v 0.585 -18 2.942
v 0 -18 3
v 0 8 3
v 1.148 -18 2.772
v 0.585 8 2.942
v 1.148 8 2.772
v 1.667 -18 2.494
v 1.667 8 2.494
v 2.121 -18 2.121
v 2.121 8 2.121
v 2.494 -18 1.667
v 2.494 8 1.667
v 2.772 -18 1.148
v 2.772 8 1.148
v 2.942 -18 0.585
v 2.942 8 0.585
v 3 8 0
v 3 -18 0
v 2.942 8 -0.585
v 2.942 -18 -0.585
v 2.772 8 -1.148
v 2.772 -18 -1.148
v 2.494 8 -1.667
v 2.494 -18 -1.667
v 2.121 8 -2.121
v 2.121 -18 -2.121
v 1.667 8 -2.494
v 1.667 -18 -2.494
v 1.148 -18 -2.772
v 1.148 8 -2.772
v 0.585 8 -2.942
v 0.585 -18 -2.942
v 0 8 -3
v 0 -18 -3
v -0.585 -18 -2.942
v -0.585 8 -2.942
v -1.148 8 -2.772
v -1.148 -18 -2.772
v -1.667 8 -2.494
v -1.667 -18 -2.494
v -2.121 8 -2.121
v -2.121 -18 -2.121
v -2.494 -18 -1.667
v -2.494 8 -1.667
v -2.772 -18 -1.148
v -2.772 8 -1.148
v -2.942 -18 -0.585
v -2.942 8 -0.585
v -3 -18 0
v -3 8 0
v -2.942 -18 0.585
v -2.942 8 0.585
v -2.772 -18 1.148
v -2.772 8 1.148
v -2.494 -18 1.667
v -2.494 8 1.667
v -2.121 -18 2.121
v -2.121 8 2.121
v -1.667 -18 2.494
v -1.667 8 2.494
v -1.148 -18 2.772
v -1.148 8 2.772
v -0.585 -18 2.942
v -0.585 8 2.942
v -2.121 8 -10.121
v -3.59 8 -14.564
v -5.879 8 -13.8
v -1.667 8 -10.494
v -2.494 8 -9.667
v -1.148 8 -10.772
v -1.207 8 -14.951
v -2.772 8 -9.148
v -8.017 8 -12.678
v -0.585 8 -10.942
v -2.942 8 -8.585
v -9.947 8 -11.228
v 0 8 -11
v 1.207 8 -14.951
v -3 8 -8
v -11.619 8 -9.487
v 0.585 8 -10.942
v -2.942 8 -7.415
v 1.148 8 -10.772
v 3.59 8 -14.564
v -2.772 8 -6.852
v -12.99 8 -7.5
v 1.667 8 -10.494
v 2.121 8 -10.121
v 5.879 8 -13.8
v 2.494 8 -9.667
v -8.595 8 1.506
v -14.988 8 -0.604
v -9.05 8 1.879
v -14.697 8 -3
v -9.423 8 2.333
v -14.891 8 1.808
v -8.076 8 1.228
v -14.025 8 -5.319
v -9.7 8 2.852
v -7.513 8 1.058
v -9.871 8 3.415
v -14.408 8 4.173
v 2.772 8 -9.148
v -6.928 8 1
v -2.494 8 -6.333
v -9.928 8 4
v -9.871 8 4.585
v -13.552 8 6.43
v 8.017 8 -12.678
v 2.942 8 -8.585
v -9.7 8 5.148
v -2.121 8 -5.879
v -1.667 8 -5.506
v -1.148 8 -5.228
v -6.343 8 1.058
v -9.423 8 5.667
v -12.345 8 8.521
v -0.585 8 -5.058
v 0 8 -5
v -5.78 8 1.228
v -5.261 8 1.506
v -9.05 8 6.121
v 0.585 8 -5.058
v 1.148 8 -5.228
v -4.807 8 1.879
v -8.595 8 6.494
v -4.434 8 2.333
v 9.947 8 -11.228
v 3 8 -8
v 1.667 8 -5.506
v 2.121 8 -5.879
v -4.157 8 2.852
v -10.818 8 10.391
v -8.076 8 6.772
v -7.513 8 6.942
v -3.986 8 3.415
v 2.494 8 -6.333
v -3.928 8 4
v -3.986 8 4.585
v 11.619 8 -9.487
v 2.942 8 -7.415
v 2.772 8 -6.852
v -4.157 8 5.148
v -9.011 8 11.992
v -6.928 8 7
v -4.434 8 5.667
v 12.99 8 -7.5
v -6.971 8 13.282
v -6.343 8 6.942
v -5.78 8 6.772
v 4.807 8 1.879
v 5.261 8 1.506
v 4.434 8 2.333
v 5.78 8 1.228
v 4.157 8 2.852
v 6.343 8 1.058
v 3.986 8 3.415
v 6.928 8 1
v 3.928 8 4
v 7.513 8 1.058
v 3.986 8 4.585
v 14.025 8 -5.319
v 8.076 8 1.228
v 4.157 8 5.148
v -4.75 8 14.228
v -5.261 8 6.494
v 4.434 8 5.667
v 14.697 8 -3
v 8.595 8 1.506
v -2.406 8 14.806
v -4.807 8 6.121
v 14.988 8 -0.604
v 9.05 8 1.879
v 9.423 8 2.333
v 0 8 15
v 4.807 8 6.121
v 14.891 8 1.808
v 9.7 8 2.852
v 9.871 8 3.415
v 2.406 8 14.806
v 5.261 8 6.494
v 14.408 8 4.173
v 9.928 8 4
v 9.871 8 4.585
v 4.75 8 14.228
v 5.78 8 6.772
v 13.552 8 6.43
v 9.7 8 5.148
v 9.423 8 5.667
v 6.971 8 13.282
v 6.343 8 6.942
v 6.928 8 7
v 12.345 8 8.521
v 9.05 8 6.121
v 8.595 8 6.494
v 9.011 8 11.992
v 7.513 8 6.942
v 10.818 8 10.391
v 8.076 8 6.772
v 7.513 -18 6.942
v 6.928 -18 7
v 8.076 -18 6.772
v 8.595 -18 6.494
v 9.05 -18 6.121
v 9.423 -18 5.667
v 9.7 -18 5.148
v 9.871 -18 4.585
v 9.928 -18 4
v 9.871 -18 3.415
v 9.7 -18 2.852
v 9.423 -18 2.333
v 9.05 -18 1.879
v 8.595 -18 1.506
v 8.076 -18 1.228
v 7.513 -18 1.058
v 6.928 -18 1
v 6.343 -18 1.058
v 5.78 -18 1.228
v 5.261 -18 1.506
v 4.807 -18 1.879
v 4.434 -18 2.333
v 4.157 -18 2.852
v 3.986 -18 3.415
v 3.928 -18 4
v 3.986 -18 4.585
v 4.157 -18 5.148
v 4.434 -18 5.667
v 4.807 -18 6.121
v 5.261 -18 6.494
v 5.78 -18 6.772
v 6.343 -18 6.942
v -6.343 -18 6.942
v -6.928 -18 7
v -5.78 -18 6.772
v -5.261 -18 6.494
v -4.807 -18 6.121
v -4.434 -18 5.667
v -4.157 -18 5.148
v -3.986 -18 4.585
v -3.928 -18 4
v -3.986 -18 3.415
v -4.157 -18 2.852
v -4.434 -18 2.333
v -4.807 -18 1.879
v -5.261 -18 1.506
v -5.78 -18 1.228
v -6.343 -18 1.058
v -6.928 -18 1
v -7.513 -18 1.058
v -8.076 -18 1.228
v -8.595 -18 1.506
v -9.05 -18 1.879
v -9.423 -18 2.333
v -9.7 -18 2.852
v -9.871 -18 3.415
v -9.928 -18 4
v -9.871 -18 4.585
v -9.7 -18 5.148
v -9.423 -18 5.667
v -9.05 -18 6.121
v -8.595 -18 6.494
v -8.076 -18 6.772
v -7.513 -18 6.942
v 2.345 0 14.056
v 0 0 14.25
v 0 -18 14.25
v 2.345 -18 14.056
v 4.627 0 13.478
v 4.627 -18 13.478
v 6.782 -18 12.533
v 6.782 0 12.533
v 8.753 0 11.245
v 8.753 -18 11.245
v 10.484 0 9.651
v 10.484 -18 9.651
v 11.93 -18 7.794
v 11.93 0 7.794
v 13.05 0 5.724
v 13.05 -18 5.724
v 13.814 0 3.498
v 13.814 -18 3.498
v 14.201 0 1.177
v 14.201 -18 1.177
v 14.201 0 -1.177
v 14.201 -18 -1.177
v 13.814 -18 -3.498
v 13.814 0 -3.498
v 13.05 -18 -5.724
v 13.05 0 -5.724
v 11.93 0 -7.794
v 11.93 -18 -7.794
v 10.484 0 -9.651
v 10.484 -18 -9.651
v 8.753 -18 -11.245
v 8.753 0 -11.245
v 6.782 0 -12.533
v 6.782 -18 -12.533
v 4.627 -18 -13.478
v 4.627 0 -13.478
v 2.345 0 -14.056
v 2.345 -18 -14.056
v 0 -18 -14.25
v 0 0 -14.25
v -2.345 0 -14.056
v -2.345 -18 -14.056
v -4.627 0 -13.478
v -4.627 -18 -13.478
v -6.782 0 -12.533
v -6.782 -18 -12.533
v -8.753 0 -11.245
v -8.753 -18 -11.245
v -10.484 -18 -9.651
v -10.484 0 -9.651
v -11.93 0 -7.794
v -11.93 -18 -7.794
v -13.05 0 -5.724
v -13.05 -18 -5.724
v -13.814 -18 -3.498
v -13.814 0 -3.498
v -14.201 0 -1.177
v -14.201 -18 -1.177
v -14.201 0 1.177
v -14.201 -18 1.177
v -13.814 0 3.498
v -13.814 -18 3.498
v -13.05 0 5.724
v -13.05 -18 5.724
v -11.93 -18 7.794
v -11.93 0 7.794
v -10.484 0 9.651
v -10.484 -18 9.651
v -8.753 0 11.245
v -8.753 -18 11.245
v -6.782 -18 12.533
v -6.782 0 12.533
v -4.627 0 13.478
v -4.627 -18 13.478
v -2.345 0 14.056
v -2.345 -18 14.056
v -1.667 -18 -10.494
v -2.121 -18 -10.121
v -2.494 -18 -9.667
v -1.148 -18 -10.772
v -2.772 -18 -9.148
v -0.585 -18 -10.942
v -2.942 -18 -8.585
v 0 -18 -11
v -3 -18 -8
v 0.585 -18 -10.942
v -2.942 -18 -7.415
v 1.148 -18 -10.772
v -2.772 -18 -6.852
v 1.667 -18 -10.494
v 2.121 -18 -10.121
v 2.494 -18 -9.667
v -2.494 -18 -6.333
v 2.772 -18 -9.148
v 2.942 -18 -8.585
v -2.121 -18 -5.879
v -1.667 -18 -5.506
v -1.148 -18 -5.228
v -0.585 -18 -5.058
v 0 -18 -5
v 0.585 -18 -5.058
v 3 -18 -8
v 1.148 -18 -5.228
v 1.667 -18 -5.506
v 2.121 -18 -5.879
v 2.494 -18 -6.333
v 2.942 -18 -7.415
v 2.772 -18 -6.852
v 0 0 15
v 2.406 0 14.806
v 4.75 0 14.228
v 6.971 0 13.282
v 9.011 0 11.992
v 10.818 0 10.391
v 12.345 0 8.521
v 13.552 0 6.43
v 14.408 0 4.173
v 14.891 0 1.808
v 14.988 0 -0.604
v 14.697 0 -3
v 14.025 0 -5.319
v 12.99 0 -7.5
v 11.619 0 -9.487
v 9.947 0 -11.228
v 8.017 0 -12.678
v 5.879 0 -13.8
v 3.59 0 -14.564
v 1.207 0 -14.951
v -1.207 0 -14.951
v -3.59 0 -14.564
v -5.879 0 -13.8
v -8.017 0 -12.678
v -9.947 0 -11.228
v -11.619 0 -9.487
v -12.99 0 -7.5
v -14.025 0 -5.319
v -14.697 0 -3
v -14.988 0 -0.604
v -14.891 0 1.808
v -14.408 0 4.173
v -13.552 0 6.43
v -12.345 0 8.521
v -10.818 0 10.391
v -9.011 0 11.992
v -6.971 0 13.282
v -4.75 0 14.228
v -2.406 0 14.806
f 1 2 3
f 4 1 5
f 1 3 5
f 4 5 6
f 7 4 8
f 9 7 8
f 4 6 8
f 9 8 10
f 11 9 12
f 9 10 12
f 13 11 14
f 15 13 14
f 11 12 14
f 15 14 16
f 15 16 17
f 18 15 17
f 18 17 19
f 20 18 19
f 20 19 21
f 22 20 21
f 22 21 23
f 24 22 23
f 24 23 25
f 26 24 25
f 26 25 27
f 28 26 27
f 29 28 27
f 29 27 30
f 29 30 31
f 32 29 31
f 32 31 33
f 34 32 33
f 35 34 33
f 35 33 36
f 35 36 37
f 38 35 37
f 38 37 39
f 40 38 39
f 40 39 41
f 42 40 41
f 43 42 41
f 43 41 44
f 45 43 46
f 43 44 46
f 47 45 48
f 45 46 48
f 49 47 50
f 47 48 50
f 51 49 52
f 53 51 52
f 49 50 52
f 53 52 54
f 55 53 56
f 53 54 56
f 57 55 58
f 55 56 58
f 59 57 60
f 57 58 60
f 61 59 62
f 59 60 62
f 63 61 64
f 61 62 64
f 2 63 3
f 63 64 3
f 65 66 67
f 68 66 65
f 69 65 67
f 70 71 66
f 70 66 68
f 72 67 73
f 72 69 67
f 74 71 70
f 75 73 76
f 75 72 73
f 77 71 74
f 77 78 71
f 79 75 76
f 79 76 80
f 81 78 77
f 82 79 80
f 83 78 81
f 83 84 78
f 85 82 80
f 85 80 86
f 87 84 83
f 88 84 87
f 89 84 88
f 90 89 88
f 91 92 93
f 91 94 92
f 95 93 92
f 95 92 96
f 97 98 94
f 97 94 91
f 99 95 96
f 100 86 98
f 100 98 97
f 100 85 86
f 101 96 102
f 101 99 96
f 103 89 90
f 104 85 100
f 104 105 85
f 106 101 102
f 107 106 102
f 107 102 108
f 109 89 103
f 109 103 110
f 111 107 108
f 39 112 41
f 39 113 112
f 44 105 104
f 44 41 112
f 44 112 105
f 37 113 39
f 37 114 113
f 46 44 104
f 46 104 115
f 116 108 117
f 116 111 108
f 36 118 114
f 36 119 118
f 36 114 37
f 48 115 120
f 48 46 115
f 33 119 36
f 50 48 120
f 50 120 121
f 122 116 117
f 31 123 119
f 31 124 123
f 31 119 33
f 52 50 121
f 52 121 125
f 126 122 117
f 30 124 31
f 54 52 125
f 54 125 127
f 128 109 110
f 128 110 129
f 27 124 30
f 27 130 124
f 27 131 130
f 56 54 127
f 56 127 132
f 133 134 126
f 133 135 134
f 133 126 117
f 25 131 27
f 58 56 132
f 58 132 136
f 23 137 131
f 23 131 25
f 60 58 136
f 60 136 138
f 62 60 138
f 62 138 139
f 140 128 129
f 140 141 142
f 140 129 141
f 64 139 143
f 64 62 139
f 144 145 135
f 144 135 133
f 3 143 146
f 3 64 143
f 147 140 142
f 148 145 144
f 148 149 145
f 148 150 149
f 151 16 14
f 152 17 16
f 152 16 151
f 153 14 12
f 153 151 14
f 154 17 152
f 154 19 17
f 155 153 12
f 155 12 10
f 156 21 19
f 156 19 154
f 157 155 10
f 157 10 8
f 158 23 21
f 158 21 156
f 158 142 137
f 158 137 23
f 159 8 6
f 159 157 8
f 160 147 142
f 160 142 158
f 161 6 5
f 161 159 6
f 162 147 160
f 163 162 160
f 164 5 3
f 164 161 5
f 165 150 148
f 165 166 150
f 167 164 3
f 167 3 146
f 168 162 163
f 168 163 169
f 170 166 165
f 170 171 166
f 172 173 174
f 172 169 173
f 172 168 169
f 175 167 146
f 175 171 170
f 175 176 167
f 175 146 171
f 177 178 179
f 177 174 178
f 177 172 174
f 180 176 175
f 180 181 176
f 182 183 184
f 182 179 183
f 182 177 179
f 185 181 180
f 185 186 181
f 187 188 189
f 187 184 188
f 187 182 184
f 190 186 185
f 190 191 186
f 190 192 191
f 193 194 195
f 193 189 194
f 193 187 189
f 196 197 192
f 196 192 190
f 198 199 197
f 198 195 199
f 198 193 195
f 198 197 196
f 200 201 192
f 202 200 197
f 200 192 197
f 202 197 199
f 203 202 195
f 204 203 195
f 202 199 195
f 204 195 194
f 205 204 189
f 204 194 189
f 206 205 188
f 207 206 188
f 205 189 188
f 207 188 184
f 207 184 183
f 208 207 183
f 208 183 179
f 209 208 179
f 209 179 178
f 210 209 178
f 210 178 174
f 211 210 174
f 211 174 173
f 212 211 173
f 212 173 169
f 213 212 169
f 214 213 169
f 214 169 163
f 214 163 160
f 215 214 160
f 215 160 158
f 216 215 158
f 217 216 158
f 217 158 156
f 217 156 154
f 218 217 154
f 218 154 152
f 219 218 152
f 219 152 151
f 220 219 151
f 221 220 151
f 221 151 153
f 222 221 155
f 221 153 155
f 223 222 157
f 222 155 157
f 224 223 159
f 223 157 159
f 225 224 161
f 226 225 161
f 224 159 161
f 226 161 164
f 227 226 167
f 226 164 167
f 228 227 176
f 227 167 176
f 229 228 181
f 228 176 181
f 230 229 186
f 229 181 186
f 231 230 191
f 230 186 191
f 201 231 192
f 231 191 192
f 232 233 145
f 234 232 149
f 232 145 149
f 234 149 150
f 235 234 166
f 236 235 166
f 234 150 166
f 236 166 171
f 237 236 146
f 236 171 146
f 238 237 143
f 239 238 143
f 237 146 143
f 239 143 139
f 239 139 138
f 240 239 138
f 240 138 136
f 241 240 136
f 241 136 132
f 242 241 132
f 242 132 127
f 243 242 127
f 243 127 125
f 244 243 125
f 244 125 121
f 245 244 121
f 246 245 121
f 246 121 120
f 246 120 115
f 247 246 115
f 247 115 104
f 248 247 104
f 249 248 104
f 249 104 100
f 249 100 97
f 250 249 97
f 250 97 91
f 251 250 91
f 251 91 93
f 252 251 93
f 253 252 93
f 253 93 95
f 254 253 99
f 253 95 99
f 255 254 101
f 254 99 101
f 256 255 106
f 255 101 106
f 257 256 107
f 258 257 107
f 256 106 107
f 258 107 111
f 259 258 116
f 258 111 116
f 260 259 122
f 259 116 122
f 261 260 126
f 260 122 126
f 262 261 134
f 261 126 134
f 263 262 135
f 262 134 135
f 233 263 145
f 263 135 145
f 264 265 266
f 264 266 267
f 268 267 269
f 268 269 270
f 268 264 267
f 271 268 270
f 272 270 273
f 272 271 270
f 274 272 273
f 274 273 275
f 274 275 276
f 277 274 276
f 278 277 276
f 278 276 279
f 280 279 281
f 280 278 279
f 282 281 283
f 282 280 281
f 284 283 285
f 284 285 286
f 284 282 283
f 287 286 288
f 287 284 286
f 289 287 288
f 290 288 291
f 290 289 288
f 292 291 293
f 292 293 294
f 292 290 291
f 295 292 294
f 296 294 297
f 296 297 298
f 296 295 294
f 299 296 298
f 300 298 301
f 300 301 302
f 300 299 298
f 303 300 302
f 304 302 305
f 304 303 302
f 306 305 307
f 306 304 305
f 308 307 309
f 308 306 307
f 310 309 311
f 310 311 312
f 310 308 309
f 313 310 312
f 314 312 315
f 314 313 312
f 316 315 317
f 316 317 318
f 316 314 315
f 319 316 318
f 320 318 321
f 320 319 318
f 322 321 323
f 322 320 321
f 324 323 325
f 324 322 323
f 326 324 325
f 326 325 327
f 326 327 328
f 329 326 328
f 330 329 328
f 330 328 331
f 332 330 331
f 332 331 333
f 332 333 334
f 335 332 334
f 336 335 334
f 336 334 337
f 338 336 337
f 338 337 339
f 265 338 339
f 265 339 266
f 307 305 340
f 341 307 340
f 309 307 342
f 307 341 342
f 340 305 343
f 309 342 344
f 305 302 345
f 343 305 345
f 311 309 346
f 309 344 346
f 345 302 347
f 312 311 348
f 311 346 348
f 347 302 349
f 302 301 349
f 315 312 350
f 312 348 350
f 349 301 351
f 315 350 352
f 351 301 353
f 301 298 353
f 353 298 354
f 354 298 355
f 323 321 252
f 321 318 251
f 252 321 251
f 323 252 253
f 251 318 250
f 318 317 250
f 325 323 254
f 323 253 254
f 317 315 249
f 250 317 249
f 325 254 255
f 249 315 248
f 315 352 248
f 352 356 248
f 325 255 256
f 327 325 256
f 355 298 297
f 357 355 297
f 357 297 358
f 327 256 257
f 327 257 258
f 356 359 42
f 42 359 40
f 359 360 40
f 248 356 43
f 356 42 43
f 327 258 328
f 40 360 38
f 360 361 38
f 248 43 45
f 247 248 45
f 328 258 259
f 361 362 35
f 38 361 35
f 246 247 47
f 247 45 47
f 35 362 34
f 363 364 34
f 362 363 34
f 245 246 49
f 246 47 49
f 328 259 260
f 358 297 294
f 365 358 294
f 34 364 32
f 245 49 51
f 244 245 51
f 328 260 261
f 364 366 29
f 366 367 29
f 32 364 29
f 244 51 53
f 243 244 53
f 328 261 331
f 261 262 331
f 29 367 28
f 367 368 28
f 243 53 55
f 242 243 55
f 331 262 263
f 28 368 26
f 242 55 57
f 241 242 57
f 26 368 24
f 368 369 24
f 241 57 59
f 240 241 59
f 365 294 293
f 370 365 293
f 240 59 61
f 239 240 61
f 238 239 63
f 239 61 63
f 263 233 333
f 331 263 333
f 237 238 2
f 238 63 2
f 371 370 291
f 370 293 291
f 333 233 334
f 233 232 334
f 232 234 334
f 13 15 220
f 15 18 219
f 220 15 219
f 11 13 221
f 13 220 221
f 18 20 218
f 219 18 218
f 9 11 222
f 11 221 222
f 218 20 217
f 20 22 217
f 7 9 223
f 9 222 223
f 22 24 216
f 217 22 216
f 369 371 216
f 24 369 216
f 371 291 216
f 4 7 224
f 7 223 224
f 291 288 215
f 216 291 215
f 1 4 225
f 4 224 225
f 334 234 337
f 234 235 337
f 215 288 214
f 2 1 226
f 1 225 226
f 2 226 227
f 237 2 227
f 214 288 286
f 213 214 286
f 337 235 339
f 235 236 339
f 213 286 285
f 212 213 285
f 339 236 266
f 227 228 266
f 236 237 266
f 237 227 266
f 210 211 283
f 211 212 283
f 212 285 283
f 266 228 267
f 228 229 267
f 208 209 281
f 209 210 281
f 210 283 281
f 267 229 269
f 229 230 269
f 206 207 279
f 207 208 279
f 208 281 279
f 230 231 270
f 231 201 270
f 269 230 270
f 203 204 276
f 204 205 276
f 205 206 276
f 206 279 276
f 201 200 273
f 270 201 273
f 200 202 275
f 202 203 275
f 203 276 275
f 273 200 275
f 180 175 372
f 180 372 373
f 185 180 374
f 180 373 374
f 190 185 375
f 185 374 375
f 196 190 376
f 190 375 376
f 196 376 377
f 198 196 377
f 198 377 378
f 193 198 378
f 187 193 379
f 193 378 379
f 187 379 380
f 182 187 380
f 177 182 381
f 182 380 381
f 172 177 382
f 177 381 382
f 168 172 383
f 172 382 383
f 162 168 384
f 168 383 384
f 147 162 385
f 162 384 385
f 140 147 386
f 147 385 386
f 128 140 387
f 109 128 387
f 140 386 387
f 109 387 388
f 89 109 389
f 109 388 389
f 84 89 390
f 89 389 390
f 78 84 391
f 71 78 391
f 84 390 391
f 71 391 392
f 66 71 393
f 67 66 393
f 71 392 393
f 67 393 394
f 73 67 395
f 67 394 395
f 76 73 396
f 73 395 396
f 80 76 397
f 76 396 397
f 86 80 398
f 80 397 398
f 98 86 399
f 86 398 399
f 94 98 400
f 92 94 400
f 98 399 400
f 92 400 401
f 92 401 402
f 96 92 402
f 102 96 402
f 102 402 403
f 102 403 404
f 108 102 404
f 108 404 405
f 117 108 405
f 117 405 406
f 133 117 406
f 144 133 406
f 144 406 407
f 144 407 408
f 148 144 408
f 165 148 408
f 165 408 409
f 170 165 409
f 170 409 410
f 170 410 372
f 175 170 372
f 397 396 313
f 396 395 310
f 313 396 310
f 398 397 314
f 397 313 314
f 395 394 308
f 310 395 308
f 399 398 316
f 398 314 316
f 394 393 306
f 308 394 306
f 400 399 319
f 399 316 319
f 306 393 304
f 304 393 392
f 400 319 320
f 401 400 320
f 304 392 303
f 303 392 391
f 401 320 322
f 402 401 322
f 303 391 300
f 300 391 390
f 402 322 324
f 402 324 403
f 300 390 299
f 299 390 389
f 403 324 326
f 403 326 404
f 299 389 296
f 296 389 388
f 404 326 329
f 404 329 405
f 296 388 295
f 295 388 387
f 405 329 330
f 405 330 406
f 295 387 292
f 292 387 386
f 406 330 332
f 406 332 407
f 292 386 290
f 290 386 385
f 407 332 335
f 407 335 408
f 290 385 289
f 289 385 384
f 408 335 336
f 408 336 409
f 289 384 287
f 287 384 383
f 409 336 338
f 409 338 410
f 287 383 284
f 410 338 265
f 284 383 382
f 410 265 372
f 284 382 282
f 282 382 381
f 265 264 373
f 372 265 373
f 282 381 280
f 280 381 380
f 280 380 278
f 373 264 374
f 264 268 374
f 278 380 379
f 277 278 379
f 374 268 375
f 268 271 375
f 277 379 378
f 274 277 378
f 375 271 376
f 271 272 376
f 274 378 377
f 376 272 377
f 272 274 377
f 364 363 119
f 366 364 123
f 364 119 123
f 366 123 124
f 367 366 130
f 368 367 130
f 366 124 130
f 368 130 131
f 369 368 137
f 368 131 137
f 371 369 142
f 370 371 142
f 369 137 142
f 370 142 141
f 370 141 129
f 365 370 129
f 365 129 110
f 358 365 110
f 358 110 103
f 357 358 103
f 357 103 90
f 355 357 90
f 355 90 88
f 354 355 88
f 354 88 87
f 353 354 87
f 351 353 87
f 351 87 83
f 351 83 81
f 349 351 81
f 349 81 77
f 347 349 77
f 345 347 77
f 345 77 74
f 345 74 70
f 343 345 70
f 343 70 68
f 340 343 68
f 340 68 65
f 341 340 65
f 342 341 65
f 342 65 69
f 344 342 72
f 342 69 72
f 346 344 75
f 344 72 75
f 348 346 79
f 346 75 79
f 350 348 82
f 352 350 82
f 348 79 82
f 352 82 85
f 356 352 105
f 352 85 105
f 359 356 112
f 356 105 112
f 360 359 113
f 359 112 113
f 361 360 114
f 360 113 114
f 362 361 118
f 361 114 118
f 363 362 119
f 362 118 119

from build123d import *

# Parameters (mm, degrees)
SKETCH_1_R          = 15
EXTRUDE_1_DEPTH     = 8
SKETCH_1_3_R        = 14.25
EXTRUDE_2_DEPTH     = 18
SKETCH_2_R          = 3
CUT_EXTRUDE_1_DEPTH = 34.555923471


with BuildPart() as part:
    # 스케치1 → 보스-돌출1 (new body)
    with BuildSketch(Plane(origin=(0, 0, 0), x_dir=(1, 0, 0), z_dir=(0, 1, 0))):
        Circle(SKETCH_1_R)
    extrude(amount=EXTRUDE_1_DEPTH)

    # 스케치1<3> → 보스-돌출2 (add)
    with BuildSketch(Plane(origin=(0, 0, 0), x_dir=(1, 0, 0), z_dir=(0, 1, 0))):
        Circle(SKETCH_1_3_R)
    extrude(amount=-EXTRUDE_2_DEPTH)

    # 스케치2 → 컷-돌출1 (cut, through all)
    with BuildSketch(Plane(origin=(0, 8, 0), x_dir=(1, 0, 0), z_dir=(0, 1, 0))):
        with Locations((0, 8)):
            Circle(SKETCH_2_R)
        Circle(SKETCH_2_R)
        with Locations((6.92820323, -4)):
            Circle(SKETCH_2_R)
        with Locations((-6.92820323, -4)):
            Circle(SKETCH_2_R)
    extrude(amount=-CUT_EXTRUDE_1_DEPTH, mode=Mode.SUBTRACT)


solid = part.part
